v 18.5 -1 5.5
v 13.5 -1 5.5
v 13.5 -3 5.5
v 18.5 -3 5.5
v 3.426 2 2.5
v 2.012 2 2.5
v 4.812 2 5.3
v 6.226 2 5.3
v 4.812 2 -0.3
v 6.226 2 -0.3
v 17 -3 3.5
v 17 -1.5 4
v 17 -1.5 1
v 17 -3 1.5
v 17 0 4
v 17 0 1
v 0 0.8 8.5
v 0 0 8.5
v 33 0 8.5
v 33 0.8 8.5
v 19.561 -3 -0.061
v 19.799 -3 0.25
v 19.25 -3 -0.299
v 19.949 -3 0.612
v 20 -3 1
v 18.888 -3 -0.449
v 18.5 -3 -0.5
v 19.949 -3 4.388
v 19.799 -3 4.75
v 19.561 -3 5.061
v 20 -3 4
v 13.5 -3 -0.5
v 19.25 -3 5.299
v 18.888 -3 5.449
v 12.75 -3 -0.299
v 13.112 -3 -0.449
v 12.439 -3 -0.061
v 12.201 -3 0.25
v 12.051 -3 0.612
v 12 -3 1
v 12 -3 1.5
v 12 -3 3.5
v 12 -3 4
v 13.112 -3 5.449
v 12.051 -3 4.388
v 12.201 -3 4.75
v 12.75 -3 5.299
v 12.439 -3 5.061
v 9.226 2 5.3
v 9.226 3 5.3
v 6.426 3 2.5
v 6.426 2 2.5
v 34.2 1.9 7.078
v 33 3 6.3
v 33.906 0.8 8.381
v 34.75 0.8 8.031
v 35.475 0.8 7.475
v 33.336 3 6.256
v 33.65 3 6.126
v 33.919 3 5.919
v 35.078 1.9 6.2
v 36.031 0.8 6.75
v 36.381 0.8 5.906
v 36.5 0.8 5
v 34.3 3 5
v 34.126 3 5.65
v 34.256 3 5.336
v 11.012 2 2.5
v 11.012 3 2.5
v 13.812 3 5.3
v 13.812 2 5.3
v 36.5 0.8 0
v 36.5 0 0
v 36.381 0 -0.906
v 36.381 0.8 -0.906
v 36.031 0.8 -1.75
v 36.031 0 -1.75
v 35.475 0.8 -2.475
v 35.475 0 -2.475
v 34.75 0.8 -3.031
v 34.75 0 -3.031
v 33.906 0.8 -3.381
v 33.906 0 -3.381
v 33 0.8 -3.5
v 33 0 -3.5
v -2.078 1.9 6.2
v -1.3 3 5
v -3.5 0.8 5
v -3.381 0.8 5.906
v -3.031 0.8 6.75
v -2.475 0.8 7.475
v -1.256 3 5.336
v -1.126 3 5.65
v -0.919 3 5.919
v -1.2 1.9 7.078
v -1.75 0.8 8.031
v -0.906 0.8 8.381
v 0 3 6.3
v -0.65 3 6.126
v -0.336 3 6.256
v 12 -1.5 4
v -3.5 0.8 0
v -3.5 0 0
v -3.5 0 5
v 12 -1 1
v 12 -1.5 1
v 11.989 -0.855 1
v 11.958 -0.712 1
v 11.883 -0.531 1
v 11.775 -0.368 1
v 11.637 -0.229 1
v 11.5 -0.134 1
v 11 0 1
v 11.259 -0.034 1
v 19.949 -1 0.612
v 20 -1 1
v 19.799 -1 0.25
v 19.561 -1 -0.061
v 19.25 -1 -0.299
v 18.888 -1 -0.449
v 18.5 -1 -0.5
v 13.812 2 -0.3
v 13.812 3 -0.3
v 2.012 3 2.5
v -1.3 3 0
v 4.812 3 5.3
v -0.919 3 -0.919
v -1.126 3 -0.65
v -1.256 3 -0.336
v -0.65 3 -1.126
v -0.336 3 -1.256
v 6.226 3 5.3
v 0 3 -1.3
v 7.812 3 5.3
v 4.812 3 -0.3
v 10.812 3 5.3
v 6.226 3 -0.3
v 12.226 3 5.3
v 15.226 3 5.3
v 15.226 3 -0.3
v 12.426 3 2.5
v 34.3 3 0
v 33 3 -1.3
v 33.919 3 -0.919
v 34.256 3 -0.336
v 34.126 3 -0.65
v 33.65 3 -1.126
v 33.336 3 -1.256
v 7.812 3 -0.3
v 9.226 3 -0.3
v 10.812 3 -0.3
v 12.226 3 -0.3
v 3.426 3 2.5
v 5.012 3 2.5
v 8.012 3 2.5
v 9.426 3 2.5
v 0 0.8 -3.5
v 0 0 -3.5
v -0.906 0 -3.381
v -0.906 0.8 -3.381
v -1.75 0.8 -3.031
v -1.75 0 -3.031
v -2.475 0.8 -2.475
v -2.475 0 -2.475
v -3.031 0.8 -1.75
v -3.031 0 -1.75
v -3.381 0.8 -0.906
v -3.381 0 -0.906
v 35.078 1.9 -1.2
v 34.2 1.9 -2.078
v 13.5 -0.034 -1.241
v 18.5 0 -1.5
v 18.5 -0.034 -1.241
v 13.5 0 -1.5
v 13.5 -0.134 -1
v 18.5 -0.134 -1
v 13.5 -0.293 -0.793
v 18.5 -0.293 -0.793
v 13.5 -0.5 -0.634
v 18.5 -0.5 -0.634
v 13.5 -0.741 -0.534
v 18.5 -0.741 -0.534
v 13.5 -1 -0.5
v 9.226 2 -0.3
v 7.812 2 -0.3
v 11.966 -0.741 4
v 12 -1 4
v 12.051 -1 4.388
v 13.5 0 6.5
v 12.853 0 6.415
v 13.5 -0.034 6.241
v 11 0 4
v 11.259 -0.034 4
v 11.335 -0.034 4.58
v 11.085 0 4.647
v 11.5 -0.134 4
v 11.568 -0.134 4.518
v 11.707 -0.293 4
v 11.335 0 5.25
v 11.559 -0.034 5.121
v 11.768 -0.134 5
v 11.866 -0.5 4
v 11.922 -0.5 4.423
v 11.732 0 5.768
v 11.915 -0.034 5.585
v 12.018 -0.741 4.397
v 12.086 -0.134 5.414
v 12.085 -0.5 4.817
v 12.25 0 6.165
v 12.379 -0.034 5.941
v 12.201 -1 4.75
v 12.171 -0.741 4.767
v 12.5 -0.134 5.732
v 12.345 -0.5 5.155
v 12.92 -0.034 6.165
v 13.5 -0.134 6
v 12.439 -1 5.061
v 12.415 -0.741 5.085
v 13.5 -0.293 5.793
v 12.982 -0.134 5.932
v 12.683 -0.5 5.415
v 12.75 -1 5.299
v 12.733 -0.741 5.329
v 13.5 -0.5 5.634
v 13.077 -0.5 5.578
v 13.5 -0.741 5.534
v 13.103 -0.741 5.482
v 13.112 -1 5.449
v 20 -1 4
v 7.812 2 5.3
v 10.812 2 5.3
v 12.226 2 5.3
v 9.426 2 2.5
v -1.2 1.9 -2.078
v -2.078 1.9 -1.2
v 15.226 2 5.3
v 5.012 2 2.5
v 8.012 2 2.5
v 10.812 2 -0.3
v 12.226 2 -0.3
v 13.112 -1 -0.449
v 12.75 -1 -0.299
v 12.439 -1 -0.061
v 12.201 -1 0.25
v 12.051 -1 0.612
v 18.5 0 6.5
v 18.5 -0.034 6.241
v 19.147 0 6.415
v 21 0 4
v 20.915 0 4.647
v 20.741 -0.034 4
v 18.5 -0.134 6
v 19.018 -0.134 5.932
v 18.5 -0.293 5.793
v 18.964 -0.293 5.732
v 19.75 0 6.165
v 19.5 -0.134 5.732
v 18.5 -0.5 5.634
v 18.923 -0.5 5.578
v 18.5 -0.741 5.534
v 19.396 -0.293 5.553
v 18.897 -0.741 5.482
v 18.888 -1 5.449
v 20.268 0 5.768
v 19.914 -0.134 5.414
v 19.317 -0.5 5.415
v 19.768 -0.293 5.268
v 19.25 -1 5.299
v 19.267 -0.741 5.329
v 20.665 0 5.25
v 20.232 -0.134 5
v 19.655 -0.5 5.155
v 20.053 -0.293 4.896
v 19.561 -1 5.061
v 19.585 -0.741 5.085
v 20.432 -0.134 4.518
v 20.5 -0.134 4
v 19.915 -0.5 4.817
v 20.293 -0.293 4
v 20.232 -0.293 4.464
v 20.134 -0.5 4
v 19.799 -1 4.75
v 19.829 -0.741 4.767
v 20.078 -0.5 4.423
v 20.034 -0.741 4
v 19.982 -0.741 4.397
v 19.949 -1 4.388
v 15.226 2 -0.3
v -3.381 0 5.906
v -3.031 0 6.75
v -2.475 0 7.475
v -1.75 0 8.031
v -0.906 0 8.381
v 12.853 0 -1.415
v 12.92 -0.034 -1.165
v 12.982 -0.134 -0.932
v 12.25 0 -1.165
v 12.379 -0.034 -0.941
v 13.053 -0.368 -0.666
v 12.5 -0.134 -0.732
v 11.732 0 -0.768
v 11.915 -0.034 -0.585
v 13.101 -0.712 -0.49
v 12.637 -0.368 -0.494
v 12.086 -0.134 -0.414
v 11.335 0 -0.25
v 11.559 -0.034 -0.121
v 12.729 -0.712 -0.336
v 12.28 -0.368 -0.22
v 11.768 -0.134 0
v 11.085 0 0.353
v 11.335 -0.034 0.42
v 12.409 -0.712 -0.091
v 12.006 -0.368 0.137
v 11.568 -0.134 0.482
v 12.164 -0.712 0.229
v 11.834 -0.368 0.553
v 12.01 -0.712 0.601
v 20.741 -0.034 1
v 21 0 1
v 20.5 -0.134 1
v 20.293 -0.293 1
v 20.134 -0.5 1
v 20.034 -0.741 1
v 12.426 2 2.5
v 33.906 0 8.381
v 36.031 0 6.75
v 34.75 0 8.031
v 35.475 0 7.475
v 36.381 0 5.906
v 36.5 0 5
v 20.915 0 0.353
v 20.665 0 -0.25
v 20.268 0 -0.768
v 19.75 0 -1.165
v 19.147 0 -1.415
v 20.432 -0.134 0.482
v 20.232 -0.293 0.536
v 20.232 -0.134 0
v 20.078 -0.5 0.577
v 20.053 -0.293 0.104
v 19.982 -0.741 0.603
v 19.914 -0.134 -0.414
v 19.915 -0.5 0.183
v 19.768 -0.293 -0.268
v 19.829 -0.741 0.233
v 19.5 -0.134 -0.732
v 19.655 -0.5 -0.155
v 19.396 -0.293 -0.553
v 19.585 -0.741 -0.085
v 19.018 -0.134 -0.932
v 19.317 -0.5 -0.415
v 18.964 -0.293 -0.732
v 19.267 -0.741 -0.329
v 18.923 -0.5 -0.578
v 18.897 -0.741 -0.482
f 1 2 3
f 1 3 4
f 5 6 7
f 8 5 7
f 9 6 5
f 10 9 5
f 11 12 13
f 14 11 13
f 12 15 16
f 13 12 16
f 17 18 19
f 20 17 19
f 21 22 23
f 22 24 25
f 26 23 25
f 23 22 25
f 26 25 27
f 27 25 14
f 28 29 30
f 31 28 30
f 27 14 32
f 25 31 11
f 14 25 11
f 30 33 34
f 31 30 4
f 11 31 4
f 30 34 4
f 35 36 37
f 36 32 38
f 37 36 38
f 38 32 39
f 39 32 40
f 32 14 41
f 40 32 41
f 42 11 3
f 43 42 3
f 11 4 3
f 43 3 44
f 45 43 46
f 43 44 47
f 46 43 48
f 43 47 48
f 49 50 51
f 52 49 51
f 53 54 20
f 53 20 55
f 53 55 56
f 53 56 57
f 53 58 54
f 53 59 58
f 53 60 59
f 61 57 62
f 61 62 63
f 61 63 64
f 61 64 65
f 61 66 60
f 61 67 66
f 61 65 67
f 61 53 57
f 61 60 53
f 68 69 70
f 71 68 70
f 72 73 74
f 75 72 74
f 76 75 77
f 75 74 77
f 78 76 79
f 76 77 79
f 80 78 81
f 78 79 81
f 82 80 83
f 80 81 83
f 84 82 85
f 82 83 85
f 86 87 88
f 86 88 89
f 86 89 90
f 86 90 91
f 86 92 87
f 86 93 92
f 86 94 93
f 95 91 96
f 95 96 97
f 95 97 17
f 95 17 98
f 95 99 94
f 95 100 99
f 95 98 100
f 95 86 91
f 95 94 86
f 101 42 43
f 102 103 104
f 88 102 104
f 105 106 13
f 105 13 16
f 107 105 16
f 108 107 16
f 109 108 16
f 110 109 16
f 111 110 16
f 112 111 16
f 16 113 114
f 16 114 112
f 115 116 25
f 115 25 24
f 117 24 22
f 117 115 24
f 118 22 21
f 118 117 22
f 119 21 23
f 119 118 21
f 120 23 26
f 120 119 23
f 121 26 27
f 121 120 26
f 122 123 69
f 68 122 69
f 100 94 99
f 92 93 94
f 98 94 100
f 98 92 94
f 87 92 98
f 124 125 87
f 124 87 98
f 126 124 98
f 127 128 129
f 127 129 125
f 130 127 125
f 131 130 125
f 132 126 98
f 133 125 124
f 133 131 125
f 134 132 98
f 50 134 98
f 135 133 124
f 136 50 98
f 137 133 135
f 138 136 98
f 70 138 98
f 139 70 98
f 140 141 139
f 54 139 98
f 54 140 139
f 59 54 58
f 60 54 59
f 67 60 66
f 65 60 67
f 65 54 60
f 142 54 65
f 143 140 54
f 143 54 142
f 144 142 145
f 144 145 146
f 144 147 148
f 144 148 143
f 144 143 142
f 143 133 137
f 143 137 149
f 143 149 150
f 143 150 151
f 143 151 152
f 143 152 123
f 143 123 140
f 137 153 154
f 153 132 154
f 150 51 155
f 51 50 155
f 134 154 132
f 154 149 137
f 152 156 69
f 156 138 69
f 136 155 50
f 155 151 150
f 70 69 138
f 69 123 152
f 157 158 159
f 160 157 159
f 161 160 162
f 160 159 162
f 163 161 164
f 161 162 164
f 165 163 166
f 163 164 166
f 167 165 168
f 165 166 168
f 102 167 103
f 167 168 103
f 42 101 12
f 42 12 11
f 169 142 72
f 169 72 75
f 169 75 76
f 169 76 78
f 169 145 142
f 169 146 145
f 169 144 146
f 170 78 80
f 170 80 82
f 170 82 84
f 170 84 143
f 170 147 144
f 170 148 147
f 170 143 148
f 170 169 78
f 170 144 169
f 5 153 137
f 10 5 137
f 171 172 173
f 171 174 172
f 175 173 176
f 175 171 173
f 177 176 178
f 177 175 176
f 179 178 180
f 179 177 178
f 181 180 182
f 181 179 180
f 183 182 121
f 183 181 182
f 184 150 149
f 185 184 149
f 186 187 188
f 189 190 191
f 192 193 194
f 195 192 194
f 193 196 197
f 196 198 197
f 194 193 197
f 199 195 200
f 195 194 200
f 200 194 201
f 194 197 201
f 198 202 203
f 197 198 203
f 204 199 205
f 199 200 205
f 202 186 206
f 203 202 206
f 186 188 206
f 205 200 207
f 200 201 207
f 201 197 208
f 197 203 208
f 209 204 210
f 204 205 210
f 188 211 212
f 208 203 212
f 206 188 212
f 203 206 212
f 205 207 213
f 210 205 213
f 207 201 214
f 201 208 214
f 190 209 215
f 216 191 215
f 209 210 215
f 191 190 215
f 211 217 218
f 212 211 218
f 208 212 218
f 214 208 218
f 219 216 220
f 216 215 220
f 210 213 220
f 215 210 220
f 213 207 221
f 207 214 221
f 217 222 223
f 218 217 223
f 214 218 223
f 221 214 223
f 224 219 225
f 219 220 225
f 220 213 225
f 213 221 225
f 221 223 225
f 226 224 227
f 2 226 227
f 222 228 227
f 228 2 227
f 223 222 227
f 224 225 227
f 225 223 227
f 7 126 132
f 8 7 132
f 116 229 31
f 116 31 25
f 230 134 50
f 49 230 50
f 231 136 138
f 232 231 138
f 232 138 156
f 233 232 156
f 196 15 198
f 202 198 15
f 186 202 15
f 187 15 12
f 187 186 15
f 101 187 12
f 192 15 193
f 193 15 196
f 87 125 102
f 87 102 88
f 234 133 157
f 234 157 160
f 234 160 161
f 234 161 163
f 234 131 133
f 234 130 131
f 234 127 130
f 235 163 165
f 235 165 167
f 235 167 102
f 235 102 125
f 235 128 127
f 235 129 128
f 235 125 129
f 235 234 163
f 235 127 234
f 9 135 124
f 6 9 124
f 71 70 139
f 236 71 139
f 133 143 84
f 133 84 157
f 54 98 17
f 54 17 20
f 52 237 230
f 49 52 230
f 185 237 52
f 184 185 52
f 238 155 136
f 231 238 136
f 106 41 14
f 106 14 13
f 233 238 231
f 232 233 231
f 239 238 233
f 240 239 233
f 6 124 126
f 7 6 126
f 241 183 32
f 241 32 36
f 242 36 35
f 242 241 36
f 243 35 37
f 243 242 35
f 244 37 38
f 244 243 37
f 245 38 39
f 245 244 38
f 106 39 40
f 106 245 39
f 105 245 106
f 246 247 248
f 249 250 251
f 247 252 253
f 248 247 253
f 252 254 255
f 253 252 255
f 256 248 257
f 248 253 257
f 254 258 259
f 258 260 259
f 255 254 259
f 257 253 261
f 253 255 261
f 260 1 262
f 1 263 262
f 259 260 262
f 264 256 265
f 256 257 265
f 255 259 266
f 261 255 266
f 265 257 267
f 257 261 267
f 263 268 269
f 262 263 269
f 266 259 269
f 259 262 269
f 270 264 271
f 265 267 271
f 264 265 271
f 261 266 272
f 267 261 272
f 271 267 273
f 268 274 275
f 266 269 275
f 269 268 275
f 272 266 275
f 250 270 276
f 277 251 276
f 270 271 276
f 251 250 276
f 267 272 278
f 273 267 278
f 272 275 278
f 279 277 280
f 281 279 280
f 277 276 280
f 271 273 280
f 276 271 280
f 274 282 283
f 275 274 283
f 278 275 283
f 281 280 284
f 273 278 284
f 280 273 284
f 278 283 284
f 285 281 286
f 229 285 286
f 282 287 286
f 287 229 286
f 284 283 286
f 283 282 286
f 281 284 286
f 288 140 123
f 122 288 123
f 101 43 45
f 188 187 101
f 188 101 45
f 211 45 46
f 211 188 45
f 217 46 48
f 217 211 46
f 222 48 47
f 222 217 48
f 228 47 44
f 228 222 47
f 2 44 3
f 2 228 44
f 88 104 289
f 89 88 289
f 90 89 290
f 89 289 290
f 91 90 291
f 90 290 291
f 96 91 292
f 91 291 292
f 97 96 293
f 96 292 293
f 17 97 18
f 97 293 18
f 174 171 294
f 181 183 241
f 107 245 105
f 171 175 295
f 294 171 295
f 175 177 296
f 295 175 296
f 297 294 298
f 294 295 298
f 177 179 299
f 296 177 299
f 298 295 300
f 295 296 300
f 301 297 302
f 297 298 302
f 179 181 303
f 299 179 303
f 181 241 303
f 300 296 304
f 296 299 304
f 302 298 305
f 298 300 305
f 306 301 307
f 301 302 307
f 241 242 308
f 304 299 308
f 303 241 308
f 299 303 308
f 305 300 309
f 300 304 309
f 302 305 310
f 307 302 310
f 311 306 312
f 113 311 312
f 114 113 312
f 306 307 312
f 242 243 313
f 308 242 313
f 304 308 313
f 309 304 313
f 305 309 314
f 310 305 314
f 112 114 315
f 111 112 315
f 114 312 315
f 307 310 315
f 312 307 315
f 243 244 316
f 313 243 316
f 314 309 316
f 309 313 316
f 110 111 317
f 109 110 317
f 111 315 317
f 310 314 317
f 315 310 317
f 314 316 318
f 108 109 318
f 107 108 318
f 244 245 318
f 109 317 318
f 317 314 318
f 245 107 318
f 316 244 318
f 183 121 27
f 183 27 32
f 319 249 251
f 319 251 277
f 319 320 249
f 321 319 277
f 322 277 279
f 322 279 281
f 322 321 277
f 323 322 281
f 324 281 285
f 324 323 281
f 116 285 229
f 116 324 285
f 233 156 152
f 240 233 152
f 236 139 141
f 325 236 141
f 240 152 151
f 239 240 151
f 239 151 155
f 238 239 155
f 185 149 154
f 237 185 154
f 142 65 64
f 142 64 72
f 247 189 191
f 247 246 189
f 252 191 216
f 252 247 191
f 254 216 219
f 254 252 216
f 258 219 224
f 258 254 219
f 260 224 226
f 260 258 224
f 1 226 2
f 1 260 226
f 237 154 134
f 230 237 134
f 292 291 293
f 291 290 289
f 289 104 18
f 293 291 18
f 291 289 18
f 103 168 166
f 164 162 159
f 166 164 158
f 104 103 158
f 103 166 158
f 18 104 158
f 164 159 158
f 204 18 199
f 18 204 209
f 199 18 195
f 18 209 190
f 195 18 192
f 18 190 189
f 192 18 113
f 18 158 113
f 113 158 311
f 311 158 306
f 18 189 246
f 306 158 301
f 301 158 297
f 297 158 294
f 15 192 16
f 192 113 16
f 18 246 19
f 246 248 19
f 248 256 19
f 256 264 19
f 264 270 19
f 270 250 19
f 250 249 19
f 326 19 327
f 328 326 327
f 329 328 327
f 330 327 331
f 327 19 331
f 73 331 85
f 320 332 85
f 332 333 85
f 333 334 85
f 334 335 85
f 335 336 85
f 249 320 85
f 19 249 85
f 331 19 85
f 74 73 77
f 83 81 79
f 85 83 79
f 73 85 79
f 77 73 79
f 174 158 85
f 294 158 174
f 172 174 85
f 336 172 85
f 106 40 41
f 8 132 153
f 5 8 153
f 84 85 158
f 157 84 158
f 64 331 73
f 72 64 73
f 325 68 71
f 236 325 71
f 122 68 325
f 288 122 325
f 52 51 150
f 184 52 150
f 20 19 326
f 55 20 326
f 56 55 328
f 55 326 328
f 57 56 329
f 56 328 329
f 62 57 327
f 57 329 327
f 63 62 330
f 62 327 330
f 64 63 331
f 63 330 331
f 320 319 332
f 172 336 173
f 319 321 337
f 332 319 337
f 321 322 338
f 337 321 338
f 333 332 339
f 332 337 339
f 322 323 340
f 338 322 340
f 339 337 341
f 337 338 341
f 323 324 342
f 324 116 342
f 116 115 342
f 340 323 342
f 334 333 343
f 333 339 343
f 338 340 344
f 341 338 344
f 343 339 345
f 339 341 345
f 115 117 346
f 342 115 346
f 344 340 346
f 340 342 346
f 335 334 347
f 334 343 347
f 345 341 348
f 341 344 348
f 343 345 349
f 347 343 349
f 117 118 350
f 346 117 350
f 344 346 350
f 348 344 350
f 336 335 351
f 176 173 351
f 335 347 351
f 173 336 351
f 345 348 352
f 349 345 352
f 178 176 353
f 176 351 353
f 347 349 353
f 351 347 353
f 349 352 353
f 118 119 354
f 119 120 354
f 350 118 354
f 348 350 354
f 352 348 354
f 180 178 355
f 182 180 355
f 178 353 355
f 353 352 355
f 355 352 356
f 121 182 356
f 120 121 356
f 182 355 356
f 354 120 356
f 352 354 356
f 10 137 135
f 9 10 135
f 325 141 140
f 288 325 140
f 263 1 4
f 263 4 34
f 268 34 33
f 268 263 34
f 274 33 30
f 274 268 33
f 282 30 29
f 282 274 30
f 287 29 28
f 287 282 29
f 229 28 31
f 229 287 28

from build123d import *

# Parameters (mm, degrees)
BOSS_EXTRUDE1_DEPTH = 3
CHAMFER1_SIZE       = 2.2
BOSS_EXTRUDE2_DEPTH = 3
CUT_EXTRUDE1_DEPTH  = 1
CUT_EXTRUDE2_DEPTH  = 5
FILLET1_R           = 1


with BuildPart() as part:
    # Sketch1 → Boss-Extrude1 (new body)
    with BuildSketch(Plane(origin=(0, 0, 0), x_dir=(1, 0, 0), z_dir=(0, 1, 0))):
        with BuildLine():
            Line((24, -8.5), (33, -8.5))
            ThreePointArc((33, -8.5), (35.474873734, -7.474873734), (36.5, -5))
            Line((36.5, -5), (36.5, 0))
            ThreePointArc((36.5, 0), (35.474873734, 2.474873734), (33, 3.5))
            Line((33, 3.5), (24, 3.5))
            Line((24, 3.5), (0, 3.5))
            ThreePointArc((0, 3.5), (-2.474873734, 2.474873734), (-3.5, 0))
            Line((-3.5, 0), (-3.5, -5))
            ThreePointArc((-3.5, -5), (-2.474873734, -7.474873734), (0, -8.5))
            Line((0, -8.5), (24, -8.5))
        make_face()
    extrude(amount=BOSS_EXTRUDE1_DEPTH)

    # Chamfer1
    chamfer1_edges = [part.edges().sort_by_distance(p)[0] for p in [
        (-3.5, 3, 2.5),
        (-2.474873734, 3, 7.474873734),
        (16.5, 3, 8.5),
        (35.474873734, 3, 7.474873734),
        (36.5, 3, 2.5),
        (35.474873734, 3, -2.474873734),
        (16.5, 3, -3.5),
        (-2.474873734, 3, -2.474873734),
    ]]
    chamfer(chamfer1_edges, length=CHAMFER1_SIZE)

    # Sketch2 → Boss-Extrude2 (add)
    with BuildSketch(Plane.XZ):
        with BuildLine():
            Line((13.5, 5.5), (18.5, 5.5))
            ThreePointArc((18.5, 5.5), (19.560660172, 5.060660172), (20, 4))
            Line((20, 4), (20, 1))
            ThreePointArc((20, 1), (19.560660172, -0.060660172), (18.5, -0.5))
            Line((18.5, -0.5), (13.5, -0.5))
            ThreePointArc((13.5, -0.5), (12.439339828, -0.060660172), (12, 1))
            Line((12, 1), (12, 4))
            ThreePointArc((12, 4), (12.439339828, 5.060660172), (13.5, 5.5))
        make_face()
    extrude(amount=BOSS_EXTRUDE2_DEPTH)

    # Sketch3 → Cut-Extrude1 (cut)
    with BuildSketch(Plane(origin=(0, 3, 0), x_dir=(1, 0, 0), z_dir=(0, 1, 0))):
        Polygon((6.225775105, 0.3), (4.811561543, 0.3), (2.011561543, -2.5), (4.811561543, -5.3), (6.225775105, -5.3), (3.425775105, -2.5), align=None)
        Polygon((9.225775105, 0.3), (7.811561543, 0.3), (5.011561543, -2.5), (7.811561543, -5.3), (9.225775105, -5.3), (6.425775105, -2.5), align=None)
        Polygon((12.225775105, 0.3), (10.811561543, 0.3), (8.011561543, -2.5), (10.811561543, -5.3), (12.225775105, -5.3), (9.425775105, -2.5), align=None)
        Polygon((15.225775105, 0.3), (13.811561543, 0.3), (11.011561543, -2.5), (13.811561543, -5.3), (15.225775105, -5.3), (12.425775105, -2.5), align=None)
    extrude(amount=-CUT_EXTRUDE1_DEPTH, mode=Mode.SUBTRACT)

    # Sketch4 → Cut-Extrude2 (cut)
    with BuildSketch(Plane.ZY.offset(-12)):
        Polygon((1.5, -3), (1, -1.5), (1, 0), (4, 0), (4, -1.5), (3.5, -3), align=None)
    extrude(amount=-CUT_EXTRUDE2_DEPTH, mode=Mode.SUBTRACT)

    # Fillet1
    fillet1_edges = [part.edges().sort_by_distance(p)[0] for p in [
        (12.439339828, 0, 5.060660172),
        (12.439339828, 0, -0.060660172),
        (16, 0, -0.5),
        (19.560660172, 0, -0.060660172),
        (20, 0, 2.5),
        (19.560660172, 0, 5.060660172),
        (16, 0, 5.5),
    ]]
    fillet(fillet1_edges, radius=FILLET1_R)


solid = part.part
